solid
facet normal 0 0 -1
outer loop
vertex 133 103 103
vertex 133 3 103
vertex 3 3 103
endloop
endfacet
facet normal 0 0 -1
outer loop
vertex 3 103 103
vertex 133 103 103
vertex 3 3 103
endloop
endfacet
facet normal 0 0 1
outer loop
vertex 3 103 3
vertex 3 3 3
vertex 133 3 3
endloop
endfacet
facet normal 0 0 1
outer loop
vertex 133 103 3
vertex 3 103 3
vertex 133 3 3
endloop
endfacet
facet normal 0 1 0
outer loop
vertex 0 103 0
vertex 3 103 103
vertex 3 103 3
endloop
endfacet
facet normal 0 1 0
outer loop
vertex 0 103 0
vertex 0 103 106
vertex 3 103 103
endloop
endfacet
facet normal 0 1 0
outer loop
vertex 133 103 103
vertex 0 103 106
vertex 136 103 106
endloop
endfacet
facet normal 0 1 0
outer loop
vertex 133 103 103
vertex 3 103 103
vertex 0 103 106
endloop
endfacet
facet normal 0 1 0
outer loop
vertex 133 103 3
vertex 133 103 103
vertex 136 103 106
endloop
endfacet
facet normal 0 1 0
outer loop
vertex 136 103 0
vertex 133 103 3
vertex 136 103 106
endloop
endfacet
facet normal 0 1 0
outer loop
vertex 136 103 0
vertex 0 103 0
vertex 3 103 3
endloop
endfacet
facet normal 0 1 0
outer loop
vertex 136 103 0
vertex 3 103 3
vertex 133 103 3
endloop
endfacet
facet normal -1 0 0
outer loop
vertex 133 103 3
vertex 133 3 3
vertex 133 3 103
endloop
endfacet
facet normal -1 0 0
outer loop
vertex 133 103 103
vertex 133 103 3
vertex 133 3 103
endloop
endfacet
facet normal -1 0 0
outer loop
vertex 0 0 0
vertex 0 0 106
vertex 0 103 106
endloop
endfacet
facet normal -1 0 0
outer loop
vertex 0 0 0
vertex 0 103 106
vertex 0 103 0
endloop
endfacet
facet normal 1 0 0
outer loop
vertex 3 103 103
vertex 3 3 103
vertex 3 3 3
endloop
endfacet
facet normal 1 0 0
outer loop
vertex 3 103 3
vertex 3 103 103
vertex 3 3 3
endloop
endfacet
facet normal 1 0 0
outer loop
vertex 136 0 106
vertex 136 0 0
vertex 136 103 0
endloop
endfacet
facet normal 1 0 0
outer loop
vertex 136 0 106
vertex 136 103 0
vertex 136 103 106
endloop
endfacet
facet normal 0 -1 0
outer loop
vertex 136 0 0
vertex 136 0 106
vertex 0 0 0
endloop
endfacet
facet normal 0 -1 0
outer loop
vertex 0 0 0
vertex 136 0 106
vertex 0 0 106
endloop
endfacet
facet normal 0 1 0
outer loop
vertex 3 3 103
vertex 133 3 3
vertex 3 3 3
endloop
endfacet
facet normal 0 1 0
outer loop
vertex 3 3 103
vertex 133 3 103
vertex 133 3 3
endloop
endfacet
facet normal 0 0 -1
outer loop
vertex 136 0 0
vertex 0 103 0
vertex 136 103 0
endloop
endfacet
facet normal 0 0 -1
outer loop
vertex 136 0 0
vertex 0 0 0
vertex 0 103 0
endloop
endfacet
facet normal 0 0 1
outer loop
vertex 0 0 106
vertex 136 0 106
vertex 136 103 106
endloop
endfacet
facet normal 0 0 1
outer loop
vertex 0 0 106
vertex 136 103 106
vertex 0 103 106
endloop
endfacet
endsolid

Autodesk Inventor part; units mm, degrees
ref_plane "YZ Plane" through (0, 0, 0) normal (1, 0, 0) x (0, 1, 0)
ref_plane "XZ Plane" through (0, 0, 0) normal (0, 1, 0) x (-1, 0, 0)
ref_plane "XY Plane" through (0, 0, 0) normal (0, 0, 1) x (1, 0, 0)
sketch "Sketch1" plane through (0, 0, 0) normal (0, 1, 0) x (-1, 0, 0)
  line L0 (0, 0) -> (-136, 0)
  line L1 (-136, 0) -> (-136, 106)
  line L2 (-136, 106) -> (0, 106)
  line L3 (0, 106) -> (0, 0)
  dimension "d0" = 106
  dimension "d1" = 136
extrude "Extrusion1" add sketch "Sketch1" along normal blind 3
sketch "Sketch2" plane through (0, 3, 0) normal (0, 1, 0) x (1, 0, 0)
  line L0 (3, -3) -> (133, -3)
  line L1 (133, -3) -> (133, -103)
  line L2 (133, -103) -> (3, -103)
  line L3 (3, -103) -> (3, -3)
  line L4 (0, 0) -> (0, -106) projected
  line L5 (136, 0) -> (0, 0) projected
  line L6 (0, -106) -> (136, -106) projected
  line L7 (0, 0) -> (136, 0)
  line L8 (136, 0) -> (136, -106)
  line L9 (136, -106) -> (0, -106)
  line L10 (0, -106) -> (0, 0)
  dimension "d4" = 130
  dimension "d5" = 100
  dimension "d6" = 3
  dimension "d7" = 3
extrude "Extrusion2" add sketch "Sketch2" along normal blind 100
properties part number "case"
